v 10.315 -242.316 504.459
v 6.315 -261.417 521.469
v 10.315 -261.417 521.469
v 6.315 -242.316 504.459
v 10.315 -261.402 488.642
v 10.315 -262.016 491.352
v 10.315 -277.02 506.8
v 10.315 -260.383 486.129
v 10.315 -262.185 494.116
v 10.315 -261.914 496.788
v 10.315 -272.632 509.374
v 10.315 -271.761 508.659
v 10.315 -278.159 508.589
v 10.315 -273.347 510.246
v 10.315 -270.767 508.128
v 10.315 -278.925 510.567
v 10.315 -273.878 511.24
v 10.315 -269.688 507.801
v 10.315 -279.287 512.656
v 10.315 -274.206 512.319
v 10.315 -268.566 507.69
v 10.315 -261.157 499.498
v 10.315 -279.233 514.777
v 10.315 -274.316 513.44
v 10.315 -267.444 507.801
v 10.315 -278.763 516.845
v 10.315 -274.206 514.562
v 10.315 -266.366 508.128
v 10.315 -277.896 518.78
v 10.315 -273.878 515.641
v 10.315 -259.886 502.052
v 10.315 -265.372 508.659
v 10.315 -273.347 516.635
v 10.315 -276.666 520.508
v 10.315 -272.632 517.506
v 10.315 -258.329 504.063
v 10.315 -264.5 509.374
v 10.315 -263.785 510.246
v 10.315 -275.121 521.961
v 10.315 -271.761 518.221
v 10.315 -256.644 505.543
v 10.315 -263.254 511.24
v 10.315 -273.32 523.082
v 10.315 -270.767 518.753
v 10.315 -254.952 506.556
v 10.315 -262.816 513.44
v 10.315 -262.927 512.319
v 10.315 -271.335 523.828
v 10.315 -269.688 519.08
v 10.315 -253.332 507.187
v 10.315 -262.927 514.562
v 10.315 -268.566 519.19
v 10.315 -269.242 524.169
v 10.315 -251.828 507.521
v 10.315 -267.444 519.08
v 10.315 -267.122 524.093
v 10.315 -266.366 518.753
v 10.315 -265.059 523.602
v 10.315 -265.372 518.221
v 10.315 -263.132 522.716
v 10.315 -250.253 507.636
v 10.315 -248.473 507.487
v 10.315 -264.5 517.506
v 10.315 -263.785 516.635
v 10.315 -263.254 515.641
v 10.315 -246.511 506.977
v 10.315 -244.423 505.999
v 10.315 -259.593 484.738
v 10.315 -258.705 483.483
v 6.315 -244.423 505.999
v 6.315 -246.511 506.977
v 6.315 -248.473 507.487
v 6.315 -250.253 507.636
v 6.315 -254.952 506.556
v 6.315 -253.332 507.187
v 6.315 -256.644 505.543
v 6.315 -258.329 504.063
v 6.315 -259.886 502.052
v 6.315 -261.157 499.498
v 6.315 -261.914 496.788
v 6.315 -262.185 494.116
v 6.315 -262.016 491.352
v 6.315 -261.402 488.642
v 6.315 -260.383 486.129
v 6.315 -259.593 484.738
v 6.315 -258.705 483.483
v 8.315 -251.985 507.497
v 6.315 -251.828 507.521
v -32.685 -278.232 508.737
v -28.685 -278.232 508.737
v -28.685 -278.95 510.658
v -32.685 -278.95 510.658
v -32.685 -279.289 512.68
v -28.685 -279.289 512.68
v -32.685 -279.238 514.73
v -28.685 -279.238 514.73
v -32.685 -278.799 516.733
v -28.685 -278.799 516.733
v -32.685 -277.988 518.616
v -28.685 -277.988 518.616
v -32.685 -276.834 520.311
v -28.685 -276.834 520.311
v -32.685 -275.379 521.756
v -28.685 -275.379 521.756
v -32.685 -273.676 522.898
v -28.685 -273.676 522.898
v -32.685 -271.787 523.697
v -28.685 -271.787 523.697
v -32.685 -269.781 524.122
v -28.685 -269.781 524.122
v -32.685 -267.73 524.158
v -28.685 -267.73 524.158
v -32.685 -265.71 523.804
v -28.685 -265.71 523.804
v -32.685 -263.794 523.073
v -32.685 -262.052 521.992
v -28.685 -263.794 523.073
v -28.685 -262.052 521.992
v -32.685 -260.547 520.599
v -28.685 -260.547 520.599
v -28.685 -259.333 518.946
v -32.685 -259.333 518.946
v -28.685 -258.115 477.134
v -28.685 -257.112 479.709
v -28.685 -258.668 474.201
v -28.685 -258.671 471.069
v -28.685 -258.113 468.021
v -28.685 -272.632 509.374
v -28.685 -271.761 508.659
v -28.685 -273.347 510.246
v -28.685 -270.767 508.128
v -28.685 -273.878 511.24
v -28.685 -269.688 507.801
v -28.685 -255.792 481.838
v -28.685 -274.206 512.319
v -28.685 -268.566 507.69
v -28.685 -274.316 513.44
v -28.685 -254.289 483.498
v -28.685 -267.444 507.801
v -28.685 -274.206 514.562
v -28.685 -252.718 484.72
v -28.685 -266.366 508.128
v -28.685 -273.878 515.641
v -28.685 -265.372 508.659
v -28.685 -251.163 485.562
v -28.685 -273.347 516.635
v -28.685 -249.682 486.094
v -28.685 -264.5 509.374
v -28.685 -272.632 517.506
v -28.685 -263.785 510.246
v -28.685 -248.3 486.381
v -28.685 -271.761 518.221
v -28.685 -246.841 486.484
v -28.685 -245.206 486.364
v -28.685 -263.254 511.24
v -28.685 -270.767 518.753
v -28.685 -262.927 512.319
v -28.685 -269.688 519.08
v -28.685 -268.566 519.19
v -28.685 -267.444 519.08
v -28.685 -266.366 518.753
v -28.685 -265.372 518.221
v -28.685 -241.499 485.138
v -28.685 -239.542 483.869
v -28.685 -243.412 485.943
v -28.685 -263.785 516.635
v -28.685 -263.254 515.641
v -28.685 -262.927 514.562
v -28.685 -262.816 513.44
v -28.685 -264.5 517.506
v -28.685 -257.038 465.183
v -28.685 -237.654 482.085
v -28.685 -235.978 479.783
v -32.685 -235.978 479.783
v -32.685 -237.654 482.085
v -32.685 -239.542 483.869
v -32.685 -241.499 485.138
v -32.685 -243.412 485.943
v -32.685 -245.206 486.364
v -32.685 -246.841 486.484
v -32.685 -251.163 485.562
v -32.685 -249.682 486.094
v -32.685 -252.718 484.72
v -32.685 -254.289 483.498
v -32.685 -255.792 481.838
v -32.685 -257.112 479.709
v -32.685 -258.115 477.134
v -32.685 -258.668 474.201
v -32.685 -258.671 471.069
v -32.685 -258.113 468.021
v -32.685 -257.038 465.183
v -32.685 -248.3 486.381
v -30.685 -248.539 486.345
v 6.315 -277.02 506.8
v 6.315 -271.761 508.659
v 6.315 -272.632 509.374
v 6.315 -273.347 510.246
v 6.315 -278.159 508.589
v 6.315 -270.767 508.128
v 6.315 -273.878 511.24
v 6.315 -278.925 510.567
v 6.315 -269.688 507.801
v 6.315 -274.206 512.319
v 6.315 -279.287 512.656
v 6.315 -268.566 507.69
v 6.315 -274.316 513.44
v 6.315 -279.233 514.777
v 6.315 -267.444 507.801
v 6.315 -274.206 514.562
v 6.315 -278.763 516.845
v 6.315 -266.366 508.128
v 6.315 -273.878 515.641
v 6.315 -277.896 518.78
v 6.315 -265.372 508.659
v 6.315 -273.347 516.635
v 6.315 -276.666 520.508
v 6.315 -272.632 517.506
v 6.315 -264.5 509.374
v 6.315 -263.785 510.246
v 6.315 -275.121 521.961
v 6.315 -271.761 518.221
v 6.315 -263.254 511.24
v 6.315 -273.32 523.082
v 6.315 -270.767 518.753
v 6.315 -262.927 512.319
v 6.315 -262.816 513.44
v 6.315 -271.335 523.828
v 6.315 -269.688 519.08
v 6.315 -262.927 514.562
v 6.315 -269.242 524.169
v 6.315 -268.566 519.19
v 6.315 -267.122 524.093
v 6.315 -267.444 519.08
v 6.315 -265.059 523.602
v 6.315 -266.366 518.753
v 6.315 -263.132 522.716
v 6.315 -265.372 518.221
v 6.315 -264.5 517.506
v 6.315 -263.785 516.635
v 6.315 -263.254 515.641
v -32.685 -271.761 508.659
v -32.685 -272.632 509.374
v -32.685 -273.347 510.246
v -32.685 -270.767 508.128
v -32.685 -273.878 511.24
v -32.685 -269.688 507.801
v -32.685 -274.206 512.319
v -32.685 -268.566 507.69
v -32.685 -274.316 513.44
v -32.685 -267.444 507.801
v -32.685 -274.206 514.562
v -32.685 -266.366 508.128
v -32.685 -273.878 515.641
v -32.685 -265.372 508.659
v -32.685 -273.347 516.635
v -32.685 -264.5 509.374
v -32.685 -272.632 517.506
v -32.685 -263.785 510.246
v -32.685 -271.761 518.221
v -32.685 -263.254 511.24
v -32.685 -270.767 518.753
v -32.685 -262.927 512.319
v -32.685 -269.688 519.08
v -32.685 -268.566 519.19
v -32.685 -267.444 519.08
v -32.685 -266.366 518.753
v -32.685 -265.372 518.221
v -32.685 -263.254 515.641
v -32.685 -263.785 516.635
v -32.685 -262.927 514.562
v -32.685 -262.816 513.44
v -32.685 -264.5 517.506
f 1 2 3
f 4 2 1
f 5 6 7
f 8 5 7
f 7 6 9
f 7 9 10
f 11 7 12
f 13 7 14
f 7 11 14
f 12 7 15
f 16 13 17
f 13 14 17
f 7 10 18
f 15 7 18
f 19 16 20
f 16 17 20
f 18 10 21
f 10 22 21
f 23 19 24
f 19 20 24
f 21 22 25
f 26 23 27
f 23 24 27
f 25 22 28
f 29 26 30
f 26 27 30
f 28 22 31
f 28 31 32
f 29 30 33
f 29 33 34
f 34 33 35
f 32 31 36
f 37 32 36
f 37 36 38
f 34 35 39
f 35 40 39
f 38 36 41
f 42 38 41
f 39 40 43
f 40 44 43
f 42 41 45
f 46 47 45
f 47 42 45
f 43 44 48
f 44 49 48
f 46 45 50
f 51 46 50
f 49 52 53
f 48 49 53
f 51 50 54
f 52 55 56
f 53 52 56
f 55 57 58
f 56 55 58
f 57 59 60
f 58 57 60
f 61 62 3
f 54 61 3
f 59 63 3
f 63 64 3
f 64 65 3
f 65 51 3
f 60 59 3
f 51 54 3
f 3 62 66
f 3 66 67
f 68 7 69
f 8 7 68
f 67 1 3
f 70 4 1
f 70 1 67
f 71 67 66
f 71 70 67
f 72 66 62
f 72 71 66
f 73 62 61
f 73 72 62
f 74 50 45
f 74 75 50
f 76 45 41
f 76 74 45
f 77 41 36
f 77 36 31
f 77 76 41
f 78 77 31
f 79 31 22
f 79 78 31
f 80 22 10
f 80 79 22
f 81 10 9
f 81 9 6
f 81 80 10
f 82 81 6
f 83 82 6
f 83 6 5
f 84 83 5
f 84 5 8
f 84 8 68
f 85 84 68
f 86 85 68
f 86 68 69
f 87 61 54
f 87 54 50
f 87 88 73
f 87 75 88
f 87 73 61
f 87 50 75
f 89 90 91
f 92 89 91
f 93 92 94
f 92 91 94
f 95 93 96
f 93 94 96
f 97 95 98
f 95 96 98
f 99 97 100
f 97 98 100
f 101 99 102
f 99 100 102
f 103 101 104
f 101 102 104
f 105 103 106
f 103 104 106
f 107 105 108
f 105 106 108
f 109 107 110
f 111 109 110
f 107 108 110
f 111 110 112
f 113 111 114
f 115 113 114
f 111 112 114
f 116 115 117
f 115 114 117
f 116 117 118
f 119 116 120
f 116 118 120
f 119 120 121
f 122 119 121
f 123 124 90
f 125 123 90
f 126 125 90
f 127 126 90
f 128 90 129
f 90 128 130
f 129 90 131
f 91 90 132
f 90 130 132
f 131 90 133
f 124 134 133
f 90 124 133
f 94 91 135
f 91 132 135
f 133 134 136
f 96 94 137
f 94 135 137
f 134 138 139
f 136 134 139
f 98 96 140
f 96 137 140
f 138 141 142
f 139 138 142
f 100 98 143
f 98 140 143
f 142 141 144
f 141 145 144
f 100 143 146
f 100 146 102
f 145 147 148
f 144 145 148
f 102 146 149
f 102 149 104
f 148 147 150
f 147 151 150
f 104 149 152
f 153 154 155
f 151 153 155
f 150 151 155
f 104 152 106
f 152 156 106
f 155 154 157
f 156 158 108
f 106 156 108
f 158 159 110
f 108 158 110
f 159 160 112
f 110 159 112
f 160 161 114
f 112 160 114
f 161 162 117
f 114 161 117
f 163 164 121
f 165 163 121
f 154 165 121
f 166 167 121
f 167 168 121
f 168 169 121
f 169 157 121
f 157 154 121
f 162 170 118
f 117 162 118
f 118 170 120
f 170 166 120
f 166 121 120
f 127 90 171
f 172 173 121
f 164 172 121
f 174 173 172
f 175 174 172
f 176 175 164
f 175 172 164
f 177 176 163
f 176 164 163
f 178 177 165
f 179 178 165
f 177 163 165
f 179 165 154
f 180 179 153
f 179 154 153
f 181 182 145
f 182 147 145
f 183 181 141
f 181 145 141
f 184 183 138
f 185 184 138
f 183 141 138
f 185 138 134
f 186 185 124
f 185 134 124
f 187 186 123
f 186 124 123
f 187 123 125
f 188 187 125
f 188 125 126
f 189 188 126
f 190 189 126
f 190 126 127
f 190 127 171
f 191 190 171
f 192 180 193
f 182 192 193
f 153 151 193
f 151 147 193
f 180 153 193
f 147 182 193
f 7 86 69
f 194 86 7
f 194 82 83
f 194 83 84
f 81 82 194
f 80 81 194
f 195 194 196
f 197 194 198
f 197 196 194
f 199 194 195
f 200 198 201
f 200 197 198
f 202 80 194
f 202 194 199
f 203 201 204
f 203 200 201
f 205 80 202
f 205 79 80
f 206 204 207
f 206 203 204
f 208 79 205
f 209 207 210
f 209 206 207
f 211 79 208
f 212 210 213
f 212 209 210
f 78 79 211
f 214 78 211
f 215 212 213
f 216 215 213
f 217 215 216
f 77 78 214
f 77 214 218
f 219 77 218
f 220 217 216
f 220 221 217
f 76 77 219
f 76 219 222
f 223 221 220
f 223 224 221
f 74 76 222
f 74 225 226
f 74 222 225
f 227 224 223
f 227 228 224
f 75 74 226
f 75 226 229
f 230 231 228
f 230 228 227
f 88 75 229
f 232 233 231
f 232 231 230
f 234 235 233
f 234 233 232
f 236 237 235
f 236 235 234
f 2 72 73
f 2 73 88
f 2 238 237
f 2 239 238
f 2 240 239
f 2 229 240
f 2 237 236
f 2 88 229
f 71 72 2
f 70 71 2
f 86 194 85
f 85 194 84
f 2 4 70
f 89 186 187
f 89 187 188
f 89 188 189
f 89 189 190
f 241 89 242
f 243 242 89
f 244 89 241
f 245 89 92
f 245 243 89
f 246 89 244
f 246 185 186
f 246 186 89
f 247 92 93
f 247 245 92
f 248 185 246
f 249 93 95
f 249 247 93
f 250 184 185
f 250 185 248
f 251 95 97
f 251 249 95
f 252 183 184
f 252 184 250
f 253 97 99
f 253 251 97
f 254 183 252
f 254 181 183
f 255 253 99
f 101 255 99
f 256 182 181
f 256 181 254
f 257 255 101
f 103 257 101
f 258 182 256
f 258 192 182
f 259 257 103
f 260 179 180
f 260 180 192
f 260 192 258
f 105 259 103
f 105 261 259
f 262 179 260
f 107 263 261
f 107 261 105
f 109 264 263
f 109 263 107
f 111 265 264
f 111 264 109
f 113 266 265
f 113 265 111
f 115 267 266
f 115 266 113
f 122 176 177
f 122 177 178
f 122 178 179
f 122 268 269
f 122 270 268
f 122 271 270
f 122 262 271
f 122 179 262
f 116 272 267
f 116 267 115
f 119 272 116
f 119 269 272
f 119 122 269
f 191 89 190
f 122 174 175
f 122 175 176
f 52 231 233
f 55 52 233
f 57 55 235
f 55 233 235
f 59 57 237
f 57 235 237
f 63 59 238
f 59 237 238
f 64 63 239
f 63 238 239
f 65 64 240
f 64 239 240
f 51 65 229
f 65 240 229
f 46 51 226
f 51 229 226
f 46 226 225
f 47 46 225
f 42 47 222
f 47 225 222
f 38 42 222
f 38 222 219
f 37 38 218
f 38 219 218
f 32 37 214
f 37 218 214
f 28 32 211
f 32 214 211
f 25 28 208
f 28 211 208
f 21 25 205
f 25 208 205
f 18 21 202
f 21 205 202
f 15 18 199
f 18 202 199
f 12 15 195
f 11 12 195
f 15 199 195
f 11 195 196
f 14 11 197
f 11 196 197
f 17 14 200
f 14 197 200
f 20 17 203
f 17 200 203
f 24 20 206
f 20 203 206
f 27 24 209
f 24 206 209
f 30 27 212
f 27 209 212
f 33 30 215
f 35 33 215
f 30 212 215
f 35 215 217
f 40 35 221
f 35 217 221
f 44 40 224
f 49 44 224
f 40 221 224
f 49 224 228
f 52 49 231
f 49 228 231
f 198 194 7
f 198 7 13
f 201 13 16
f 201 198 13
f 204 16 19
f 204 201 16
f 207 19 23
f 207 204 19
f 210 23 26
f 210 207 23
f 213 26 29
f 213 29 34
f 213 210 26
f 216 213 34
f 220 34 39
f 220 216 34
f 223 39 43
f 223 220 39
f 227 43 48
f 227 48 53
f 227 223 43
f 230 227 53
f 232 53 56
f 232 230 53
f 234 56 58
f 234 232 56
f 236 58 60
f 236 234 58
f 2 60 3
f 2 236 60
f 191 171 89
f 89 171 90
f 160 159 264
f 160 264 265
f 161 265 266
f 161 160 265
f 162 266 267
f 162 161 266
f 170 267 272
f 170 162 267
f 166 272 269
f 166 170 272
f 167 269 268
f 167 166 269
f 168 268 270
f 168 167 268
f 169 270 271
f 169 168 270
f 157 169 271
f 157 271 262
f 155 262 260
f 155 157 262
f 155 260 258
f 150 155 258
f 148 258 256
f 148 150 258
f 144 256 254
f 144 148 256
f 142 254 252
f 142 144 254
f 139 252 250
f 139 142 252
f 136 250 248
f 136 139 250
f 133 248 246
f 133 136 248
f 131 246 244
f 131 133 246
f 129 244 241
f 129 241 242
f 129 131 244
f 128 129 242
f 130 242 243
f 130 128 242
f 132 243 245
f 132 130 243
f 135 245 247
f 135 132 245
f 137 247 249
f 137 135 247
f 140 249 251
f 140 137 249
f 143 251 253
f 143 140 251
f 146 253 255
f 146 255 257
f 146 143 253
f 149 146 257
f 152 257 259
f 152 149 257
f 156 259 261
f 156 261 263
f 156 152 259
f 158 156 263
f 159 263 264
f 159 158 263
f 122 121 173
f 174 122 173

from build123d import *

# Parameters (mm, degrees)
SZKIC1_R                    = 5.75
DODANIE_WYCI_GNI_CIE1_DEPTH = 4
SZKIC2_R                    = 5.75
DODANIE_WYCI_GNI_CIE2_DEPTH = 4


with BuildPart() as part:
    # Szkic1 → Dodanie-wyciągnięcie1 (new body)
    with BuildSketch(Plane(origin=(-28.685367511, 1.43e-07, -7.33e-07), x_dir=(-2.6e-08, 0, 1), z_dir=(-1, 5e-09, -2.6e-08))):
        with BuildLine():
            Line((465.183030948, -257.038339395), (508.736535292, -278.232362129))
            ThreePointArc((508.736535292, -278.232362129), (522.898407751, -273.675636359), (518.946424449, -259.333244325))
            Line((518.946424449, -259.333244325), (479.782824247, -235.97770815))
            add(Edge.make_bspline(
                [(479.782824247, -235.97770815), (485.271231223, -239.250764943), (487.05070972, -244.206726363), (486.344854352, -248.538774469), (485.058364408, -256.434352762), (476.490731879, -262.540897093), (465.183030948, -257.038339395)],
                knots=[0.305089223, 0.305089223, 0.305089223, 0.305089223, 0.5, 0.5, 0.5, 0.792676252, 0.792676252, 0.792676252, 0.792676252], degree=3, weights=[0.52427858, 0.581545157, 0.740118964, 1, 0.609764997, 0.44795503, 0.5145701]))
        make_face()
        with Locations((513.440338286, -268.566094111)):
            Circle(SZKIC1_R, mode=Mode.SUBTRACT)
    extrude(amount=DODANIE_WYCI_GNI_CIE1_DEPTH)


with BuildPart() as body_2:
    # Szkic2 → Dodanie-wyciągnięcie2 (new body)
    with BuildSketch(Plane(origin=(6.314632489, -3.1e-08, 1.61e-07), x_dir=(-2.6e-08, 0, 1), z_dir=(-1, 5e-09, -2.6e-08))):
        with BuildLine():
            Line((483.483036976, -258.705084661), (506.800003645, -277.019995923))
            ThreePointArc((506.800003645, -277.019995923), (521.27263456, -275.92935664), (521.468609055, -261.417012459))
            Line((521.468609055, -261.417012459), (504.458992944, -242.315565525))
            add(Edge.make_bspline(
                [(504.458992944, -242.315565525), (507.216307395, -245.411972599), (507.999423061, -248.899340162), (507.496618946, -251.985201245), (505.969078098, -261.360181924), (494.952781909, -267.71429086), (483.483036976, -258.705084661)],
                knots=[0.349940267, 0.349940267, 0.349940267, 0.349940267, 0.5, 0.5, 0.5, 0.823836763, 0.823836763, 0.823836763, 0.823836763], degree=3, weights=[0.579904455, 0.659888507, 0.799920356, 1, 0.568217649, 0.416089296, 0.543614941]))
        make_face()
        with Locations((513.440338286, -268.566094111)):
            Circle(SZKIC2_R, mode=Mode.SUBTRACT)
    extrude(amount=-DODANIE_WYCI_GNI_CIE2_DEPTH)


solid = Compound([part.part, body_2.part])
